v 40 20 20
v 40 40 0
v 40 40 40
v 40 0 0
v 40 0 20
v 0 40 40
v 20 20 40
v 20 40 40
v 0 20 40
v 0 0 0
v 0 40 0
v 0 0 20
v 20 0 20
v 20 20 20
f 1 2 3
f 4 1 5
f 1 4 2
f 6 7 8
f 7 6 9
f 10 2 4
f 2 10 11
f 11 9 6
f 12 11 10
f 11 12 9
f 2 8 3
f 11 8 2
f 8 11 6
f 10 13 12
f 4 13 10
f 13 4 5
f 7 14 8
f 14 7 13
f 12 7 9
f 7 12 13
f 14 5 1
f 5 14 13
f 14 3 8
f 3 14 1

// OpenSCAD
difference(){
 
 cube([40, 40, 40]);
 translate([0, 0, 20])
 rotate([45, 0, 0])
 cube([20, 30, 20]);
 translate([20, 0, 20])
 cube([20, 20, 20]);
  translate([20, 20, 20])
 rotate([45, 0, 0])
 cube([20, 30, 20]);  
}
